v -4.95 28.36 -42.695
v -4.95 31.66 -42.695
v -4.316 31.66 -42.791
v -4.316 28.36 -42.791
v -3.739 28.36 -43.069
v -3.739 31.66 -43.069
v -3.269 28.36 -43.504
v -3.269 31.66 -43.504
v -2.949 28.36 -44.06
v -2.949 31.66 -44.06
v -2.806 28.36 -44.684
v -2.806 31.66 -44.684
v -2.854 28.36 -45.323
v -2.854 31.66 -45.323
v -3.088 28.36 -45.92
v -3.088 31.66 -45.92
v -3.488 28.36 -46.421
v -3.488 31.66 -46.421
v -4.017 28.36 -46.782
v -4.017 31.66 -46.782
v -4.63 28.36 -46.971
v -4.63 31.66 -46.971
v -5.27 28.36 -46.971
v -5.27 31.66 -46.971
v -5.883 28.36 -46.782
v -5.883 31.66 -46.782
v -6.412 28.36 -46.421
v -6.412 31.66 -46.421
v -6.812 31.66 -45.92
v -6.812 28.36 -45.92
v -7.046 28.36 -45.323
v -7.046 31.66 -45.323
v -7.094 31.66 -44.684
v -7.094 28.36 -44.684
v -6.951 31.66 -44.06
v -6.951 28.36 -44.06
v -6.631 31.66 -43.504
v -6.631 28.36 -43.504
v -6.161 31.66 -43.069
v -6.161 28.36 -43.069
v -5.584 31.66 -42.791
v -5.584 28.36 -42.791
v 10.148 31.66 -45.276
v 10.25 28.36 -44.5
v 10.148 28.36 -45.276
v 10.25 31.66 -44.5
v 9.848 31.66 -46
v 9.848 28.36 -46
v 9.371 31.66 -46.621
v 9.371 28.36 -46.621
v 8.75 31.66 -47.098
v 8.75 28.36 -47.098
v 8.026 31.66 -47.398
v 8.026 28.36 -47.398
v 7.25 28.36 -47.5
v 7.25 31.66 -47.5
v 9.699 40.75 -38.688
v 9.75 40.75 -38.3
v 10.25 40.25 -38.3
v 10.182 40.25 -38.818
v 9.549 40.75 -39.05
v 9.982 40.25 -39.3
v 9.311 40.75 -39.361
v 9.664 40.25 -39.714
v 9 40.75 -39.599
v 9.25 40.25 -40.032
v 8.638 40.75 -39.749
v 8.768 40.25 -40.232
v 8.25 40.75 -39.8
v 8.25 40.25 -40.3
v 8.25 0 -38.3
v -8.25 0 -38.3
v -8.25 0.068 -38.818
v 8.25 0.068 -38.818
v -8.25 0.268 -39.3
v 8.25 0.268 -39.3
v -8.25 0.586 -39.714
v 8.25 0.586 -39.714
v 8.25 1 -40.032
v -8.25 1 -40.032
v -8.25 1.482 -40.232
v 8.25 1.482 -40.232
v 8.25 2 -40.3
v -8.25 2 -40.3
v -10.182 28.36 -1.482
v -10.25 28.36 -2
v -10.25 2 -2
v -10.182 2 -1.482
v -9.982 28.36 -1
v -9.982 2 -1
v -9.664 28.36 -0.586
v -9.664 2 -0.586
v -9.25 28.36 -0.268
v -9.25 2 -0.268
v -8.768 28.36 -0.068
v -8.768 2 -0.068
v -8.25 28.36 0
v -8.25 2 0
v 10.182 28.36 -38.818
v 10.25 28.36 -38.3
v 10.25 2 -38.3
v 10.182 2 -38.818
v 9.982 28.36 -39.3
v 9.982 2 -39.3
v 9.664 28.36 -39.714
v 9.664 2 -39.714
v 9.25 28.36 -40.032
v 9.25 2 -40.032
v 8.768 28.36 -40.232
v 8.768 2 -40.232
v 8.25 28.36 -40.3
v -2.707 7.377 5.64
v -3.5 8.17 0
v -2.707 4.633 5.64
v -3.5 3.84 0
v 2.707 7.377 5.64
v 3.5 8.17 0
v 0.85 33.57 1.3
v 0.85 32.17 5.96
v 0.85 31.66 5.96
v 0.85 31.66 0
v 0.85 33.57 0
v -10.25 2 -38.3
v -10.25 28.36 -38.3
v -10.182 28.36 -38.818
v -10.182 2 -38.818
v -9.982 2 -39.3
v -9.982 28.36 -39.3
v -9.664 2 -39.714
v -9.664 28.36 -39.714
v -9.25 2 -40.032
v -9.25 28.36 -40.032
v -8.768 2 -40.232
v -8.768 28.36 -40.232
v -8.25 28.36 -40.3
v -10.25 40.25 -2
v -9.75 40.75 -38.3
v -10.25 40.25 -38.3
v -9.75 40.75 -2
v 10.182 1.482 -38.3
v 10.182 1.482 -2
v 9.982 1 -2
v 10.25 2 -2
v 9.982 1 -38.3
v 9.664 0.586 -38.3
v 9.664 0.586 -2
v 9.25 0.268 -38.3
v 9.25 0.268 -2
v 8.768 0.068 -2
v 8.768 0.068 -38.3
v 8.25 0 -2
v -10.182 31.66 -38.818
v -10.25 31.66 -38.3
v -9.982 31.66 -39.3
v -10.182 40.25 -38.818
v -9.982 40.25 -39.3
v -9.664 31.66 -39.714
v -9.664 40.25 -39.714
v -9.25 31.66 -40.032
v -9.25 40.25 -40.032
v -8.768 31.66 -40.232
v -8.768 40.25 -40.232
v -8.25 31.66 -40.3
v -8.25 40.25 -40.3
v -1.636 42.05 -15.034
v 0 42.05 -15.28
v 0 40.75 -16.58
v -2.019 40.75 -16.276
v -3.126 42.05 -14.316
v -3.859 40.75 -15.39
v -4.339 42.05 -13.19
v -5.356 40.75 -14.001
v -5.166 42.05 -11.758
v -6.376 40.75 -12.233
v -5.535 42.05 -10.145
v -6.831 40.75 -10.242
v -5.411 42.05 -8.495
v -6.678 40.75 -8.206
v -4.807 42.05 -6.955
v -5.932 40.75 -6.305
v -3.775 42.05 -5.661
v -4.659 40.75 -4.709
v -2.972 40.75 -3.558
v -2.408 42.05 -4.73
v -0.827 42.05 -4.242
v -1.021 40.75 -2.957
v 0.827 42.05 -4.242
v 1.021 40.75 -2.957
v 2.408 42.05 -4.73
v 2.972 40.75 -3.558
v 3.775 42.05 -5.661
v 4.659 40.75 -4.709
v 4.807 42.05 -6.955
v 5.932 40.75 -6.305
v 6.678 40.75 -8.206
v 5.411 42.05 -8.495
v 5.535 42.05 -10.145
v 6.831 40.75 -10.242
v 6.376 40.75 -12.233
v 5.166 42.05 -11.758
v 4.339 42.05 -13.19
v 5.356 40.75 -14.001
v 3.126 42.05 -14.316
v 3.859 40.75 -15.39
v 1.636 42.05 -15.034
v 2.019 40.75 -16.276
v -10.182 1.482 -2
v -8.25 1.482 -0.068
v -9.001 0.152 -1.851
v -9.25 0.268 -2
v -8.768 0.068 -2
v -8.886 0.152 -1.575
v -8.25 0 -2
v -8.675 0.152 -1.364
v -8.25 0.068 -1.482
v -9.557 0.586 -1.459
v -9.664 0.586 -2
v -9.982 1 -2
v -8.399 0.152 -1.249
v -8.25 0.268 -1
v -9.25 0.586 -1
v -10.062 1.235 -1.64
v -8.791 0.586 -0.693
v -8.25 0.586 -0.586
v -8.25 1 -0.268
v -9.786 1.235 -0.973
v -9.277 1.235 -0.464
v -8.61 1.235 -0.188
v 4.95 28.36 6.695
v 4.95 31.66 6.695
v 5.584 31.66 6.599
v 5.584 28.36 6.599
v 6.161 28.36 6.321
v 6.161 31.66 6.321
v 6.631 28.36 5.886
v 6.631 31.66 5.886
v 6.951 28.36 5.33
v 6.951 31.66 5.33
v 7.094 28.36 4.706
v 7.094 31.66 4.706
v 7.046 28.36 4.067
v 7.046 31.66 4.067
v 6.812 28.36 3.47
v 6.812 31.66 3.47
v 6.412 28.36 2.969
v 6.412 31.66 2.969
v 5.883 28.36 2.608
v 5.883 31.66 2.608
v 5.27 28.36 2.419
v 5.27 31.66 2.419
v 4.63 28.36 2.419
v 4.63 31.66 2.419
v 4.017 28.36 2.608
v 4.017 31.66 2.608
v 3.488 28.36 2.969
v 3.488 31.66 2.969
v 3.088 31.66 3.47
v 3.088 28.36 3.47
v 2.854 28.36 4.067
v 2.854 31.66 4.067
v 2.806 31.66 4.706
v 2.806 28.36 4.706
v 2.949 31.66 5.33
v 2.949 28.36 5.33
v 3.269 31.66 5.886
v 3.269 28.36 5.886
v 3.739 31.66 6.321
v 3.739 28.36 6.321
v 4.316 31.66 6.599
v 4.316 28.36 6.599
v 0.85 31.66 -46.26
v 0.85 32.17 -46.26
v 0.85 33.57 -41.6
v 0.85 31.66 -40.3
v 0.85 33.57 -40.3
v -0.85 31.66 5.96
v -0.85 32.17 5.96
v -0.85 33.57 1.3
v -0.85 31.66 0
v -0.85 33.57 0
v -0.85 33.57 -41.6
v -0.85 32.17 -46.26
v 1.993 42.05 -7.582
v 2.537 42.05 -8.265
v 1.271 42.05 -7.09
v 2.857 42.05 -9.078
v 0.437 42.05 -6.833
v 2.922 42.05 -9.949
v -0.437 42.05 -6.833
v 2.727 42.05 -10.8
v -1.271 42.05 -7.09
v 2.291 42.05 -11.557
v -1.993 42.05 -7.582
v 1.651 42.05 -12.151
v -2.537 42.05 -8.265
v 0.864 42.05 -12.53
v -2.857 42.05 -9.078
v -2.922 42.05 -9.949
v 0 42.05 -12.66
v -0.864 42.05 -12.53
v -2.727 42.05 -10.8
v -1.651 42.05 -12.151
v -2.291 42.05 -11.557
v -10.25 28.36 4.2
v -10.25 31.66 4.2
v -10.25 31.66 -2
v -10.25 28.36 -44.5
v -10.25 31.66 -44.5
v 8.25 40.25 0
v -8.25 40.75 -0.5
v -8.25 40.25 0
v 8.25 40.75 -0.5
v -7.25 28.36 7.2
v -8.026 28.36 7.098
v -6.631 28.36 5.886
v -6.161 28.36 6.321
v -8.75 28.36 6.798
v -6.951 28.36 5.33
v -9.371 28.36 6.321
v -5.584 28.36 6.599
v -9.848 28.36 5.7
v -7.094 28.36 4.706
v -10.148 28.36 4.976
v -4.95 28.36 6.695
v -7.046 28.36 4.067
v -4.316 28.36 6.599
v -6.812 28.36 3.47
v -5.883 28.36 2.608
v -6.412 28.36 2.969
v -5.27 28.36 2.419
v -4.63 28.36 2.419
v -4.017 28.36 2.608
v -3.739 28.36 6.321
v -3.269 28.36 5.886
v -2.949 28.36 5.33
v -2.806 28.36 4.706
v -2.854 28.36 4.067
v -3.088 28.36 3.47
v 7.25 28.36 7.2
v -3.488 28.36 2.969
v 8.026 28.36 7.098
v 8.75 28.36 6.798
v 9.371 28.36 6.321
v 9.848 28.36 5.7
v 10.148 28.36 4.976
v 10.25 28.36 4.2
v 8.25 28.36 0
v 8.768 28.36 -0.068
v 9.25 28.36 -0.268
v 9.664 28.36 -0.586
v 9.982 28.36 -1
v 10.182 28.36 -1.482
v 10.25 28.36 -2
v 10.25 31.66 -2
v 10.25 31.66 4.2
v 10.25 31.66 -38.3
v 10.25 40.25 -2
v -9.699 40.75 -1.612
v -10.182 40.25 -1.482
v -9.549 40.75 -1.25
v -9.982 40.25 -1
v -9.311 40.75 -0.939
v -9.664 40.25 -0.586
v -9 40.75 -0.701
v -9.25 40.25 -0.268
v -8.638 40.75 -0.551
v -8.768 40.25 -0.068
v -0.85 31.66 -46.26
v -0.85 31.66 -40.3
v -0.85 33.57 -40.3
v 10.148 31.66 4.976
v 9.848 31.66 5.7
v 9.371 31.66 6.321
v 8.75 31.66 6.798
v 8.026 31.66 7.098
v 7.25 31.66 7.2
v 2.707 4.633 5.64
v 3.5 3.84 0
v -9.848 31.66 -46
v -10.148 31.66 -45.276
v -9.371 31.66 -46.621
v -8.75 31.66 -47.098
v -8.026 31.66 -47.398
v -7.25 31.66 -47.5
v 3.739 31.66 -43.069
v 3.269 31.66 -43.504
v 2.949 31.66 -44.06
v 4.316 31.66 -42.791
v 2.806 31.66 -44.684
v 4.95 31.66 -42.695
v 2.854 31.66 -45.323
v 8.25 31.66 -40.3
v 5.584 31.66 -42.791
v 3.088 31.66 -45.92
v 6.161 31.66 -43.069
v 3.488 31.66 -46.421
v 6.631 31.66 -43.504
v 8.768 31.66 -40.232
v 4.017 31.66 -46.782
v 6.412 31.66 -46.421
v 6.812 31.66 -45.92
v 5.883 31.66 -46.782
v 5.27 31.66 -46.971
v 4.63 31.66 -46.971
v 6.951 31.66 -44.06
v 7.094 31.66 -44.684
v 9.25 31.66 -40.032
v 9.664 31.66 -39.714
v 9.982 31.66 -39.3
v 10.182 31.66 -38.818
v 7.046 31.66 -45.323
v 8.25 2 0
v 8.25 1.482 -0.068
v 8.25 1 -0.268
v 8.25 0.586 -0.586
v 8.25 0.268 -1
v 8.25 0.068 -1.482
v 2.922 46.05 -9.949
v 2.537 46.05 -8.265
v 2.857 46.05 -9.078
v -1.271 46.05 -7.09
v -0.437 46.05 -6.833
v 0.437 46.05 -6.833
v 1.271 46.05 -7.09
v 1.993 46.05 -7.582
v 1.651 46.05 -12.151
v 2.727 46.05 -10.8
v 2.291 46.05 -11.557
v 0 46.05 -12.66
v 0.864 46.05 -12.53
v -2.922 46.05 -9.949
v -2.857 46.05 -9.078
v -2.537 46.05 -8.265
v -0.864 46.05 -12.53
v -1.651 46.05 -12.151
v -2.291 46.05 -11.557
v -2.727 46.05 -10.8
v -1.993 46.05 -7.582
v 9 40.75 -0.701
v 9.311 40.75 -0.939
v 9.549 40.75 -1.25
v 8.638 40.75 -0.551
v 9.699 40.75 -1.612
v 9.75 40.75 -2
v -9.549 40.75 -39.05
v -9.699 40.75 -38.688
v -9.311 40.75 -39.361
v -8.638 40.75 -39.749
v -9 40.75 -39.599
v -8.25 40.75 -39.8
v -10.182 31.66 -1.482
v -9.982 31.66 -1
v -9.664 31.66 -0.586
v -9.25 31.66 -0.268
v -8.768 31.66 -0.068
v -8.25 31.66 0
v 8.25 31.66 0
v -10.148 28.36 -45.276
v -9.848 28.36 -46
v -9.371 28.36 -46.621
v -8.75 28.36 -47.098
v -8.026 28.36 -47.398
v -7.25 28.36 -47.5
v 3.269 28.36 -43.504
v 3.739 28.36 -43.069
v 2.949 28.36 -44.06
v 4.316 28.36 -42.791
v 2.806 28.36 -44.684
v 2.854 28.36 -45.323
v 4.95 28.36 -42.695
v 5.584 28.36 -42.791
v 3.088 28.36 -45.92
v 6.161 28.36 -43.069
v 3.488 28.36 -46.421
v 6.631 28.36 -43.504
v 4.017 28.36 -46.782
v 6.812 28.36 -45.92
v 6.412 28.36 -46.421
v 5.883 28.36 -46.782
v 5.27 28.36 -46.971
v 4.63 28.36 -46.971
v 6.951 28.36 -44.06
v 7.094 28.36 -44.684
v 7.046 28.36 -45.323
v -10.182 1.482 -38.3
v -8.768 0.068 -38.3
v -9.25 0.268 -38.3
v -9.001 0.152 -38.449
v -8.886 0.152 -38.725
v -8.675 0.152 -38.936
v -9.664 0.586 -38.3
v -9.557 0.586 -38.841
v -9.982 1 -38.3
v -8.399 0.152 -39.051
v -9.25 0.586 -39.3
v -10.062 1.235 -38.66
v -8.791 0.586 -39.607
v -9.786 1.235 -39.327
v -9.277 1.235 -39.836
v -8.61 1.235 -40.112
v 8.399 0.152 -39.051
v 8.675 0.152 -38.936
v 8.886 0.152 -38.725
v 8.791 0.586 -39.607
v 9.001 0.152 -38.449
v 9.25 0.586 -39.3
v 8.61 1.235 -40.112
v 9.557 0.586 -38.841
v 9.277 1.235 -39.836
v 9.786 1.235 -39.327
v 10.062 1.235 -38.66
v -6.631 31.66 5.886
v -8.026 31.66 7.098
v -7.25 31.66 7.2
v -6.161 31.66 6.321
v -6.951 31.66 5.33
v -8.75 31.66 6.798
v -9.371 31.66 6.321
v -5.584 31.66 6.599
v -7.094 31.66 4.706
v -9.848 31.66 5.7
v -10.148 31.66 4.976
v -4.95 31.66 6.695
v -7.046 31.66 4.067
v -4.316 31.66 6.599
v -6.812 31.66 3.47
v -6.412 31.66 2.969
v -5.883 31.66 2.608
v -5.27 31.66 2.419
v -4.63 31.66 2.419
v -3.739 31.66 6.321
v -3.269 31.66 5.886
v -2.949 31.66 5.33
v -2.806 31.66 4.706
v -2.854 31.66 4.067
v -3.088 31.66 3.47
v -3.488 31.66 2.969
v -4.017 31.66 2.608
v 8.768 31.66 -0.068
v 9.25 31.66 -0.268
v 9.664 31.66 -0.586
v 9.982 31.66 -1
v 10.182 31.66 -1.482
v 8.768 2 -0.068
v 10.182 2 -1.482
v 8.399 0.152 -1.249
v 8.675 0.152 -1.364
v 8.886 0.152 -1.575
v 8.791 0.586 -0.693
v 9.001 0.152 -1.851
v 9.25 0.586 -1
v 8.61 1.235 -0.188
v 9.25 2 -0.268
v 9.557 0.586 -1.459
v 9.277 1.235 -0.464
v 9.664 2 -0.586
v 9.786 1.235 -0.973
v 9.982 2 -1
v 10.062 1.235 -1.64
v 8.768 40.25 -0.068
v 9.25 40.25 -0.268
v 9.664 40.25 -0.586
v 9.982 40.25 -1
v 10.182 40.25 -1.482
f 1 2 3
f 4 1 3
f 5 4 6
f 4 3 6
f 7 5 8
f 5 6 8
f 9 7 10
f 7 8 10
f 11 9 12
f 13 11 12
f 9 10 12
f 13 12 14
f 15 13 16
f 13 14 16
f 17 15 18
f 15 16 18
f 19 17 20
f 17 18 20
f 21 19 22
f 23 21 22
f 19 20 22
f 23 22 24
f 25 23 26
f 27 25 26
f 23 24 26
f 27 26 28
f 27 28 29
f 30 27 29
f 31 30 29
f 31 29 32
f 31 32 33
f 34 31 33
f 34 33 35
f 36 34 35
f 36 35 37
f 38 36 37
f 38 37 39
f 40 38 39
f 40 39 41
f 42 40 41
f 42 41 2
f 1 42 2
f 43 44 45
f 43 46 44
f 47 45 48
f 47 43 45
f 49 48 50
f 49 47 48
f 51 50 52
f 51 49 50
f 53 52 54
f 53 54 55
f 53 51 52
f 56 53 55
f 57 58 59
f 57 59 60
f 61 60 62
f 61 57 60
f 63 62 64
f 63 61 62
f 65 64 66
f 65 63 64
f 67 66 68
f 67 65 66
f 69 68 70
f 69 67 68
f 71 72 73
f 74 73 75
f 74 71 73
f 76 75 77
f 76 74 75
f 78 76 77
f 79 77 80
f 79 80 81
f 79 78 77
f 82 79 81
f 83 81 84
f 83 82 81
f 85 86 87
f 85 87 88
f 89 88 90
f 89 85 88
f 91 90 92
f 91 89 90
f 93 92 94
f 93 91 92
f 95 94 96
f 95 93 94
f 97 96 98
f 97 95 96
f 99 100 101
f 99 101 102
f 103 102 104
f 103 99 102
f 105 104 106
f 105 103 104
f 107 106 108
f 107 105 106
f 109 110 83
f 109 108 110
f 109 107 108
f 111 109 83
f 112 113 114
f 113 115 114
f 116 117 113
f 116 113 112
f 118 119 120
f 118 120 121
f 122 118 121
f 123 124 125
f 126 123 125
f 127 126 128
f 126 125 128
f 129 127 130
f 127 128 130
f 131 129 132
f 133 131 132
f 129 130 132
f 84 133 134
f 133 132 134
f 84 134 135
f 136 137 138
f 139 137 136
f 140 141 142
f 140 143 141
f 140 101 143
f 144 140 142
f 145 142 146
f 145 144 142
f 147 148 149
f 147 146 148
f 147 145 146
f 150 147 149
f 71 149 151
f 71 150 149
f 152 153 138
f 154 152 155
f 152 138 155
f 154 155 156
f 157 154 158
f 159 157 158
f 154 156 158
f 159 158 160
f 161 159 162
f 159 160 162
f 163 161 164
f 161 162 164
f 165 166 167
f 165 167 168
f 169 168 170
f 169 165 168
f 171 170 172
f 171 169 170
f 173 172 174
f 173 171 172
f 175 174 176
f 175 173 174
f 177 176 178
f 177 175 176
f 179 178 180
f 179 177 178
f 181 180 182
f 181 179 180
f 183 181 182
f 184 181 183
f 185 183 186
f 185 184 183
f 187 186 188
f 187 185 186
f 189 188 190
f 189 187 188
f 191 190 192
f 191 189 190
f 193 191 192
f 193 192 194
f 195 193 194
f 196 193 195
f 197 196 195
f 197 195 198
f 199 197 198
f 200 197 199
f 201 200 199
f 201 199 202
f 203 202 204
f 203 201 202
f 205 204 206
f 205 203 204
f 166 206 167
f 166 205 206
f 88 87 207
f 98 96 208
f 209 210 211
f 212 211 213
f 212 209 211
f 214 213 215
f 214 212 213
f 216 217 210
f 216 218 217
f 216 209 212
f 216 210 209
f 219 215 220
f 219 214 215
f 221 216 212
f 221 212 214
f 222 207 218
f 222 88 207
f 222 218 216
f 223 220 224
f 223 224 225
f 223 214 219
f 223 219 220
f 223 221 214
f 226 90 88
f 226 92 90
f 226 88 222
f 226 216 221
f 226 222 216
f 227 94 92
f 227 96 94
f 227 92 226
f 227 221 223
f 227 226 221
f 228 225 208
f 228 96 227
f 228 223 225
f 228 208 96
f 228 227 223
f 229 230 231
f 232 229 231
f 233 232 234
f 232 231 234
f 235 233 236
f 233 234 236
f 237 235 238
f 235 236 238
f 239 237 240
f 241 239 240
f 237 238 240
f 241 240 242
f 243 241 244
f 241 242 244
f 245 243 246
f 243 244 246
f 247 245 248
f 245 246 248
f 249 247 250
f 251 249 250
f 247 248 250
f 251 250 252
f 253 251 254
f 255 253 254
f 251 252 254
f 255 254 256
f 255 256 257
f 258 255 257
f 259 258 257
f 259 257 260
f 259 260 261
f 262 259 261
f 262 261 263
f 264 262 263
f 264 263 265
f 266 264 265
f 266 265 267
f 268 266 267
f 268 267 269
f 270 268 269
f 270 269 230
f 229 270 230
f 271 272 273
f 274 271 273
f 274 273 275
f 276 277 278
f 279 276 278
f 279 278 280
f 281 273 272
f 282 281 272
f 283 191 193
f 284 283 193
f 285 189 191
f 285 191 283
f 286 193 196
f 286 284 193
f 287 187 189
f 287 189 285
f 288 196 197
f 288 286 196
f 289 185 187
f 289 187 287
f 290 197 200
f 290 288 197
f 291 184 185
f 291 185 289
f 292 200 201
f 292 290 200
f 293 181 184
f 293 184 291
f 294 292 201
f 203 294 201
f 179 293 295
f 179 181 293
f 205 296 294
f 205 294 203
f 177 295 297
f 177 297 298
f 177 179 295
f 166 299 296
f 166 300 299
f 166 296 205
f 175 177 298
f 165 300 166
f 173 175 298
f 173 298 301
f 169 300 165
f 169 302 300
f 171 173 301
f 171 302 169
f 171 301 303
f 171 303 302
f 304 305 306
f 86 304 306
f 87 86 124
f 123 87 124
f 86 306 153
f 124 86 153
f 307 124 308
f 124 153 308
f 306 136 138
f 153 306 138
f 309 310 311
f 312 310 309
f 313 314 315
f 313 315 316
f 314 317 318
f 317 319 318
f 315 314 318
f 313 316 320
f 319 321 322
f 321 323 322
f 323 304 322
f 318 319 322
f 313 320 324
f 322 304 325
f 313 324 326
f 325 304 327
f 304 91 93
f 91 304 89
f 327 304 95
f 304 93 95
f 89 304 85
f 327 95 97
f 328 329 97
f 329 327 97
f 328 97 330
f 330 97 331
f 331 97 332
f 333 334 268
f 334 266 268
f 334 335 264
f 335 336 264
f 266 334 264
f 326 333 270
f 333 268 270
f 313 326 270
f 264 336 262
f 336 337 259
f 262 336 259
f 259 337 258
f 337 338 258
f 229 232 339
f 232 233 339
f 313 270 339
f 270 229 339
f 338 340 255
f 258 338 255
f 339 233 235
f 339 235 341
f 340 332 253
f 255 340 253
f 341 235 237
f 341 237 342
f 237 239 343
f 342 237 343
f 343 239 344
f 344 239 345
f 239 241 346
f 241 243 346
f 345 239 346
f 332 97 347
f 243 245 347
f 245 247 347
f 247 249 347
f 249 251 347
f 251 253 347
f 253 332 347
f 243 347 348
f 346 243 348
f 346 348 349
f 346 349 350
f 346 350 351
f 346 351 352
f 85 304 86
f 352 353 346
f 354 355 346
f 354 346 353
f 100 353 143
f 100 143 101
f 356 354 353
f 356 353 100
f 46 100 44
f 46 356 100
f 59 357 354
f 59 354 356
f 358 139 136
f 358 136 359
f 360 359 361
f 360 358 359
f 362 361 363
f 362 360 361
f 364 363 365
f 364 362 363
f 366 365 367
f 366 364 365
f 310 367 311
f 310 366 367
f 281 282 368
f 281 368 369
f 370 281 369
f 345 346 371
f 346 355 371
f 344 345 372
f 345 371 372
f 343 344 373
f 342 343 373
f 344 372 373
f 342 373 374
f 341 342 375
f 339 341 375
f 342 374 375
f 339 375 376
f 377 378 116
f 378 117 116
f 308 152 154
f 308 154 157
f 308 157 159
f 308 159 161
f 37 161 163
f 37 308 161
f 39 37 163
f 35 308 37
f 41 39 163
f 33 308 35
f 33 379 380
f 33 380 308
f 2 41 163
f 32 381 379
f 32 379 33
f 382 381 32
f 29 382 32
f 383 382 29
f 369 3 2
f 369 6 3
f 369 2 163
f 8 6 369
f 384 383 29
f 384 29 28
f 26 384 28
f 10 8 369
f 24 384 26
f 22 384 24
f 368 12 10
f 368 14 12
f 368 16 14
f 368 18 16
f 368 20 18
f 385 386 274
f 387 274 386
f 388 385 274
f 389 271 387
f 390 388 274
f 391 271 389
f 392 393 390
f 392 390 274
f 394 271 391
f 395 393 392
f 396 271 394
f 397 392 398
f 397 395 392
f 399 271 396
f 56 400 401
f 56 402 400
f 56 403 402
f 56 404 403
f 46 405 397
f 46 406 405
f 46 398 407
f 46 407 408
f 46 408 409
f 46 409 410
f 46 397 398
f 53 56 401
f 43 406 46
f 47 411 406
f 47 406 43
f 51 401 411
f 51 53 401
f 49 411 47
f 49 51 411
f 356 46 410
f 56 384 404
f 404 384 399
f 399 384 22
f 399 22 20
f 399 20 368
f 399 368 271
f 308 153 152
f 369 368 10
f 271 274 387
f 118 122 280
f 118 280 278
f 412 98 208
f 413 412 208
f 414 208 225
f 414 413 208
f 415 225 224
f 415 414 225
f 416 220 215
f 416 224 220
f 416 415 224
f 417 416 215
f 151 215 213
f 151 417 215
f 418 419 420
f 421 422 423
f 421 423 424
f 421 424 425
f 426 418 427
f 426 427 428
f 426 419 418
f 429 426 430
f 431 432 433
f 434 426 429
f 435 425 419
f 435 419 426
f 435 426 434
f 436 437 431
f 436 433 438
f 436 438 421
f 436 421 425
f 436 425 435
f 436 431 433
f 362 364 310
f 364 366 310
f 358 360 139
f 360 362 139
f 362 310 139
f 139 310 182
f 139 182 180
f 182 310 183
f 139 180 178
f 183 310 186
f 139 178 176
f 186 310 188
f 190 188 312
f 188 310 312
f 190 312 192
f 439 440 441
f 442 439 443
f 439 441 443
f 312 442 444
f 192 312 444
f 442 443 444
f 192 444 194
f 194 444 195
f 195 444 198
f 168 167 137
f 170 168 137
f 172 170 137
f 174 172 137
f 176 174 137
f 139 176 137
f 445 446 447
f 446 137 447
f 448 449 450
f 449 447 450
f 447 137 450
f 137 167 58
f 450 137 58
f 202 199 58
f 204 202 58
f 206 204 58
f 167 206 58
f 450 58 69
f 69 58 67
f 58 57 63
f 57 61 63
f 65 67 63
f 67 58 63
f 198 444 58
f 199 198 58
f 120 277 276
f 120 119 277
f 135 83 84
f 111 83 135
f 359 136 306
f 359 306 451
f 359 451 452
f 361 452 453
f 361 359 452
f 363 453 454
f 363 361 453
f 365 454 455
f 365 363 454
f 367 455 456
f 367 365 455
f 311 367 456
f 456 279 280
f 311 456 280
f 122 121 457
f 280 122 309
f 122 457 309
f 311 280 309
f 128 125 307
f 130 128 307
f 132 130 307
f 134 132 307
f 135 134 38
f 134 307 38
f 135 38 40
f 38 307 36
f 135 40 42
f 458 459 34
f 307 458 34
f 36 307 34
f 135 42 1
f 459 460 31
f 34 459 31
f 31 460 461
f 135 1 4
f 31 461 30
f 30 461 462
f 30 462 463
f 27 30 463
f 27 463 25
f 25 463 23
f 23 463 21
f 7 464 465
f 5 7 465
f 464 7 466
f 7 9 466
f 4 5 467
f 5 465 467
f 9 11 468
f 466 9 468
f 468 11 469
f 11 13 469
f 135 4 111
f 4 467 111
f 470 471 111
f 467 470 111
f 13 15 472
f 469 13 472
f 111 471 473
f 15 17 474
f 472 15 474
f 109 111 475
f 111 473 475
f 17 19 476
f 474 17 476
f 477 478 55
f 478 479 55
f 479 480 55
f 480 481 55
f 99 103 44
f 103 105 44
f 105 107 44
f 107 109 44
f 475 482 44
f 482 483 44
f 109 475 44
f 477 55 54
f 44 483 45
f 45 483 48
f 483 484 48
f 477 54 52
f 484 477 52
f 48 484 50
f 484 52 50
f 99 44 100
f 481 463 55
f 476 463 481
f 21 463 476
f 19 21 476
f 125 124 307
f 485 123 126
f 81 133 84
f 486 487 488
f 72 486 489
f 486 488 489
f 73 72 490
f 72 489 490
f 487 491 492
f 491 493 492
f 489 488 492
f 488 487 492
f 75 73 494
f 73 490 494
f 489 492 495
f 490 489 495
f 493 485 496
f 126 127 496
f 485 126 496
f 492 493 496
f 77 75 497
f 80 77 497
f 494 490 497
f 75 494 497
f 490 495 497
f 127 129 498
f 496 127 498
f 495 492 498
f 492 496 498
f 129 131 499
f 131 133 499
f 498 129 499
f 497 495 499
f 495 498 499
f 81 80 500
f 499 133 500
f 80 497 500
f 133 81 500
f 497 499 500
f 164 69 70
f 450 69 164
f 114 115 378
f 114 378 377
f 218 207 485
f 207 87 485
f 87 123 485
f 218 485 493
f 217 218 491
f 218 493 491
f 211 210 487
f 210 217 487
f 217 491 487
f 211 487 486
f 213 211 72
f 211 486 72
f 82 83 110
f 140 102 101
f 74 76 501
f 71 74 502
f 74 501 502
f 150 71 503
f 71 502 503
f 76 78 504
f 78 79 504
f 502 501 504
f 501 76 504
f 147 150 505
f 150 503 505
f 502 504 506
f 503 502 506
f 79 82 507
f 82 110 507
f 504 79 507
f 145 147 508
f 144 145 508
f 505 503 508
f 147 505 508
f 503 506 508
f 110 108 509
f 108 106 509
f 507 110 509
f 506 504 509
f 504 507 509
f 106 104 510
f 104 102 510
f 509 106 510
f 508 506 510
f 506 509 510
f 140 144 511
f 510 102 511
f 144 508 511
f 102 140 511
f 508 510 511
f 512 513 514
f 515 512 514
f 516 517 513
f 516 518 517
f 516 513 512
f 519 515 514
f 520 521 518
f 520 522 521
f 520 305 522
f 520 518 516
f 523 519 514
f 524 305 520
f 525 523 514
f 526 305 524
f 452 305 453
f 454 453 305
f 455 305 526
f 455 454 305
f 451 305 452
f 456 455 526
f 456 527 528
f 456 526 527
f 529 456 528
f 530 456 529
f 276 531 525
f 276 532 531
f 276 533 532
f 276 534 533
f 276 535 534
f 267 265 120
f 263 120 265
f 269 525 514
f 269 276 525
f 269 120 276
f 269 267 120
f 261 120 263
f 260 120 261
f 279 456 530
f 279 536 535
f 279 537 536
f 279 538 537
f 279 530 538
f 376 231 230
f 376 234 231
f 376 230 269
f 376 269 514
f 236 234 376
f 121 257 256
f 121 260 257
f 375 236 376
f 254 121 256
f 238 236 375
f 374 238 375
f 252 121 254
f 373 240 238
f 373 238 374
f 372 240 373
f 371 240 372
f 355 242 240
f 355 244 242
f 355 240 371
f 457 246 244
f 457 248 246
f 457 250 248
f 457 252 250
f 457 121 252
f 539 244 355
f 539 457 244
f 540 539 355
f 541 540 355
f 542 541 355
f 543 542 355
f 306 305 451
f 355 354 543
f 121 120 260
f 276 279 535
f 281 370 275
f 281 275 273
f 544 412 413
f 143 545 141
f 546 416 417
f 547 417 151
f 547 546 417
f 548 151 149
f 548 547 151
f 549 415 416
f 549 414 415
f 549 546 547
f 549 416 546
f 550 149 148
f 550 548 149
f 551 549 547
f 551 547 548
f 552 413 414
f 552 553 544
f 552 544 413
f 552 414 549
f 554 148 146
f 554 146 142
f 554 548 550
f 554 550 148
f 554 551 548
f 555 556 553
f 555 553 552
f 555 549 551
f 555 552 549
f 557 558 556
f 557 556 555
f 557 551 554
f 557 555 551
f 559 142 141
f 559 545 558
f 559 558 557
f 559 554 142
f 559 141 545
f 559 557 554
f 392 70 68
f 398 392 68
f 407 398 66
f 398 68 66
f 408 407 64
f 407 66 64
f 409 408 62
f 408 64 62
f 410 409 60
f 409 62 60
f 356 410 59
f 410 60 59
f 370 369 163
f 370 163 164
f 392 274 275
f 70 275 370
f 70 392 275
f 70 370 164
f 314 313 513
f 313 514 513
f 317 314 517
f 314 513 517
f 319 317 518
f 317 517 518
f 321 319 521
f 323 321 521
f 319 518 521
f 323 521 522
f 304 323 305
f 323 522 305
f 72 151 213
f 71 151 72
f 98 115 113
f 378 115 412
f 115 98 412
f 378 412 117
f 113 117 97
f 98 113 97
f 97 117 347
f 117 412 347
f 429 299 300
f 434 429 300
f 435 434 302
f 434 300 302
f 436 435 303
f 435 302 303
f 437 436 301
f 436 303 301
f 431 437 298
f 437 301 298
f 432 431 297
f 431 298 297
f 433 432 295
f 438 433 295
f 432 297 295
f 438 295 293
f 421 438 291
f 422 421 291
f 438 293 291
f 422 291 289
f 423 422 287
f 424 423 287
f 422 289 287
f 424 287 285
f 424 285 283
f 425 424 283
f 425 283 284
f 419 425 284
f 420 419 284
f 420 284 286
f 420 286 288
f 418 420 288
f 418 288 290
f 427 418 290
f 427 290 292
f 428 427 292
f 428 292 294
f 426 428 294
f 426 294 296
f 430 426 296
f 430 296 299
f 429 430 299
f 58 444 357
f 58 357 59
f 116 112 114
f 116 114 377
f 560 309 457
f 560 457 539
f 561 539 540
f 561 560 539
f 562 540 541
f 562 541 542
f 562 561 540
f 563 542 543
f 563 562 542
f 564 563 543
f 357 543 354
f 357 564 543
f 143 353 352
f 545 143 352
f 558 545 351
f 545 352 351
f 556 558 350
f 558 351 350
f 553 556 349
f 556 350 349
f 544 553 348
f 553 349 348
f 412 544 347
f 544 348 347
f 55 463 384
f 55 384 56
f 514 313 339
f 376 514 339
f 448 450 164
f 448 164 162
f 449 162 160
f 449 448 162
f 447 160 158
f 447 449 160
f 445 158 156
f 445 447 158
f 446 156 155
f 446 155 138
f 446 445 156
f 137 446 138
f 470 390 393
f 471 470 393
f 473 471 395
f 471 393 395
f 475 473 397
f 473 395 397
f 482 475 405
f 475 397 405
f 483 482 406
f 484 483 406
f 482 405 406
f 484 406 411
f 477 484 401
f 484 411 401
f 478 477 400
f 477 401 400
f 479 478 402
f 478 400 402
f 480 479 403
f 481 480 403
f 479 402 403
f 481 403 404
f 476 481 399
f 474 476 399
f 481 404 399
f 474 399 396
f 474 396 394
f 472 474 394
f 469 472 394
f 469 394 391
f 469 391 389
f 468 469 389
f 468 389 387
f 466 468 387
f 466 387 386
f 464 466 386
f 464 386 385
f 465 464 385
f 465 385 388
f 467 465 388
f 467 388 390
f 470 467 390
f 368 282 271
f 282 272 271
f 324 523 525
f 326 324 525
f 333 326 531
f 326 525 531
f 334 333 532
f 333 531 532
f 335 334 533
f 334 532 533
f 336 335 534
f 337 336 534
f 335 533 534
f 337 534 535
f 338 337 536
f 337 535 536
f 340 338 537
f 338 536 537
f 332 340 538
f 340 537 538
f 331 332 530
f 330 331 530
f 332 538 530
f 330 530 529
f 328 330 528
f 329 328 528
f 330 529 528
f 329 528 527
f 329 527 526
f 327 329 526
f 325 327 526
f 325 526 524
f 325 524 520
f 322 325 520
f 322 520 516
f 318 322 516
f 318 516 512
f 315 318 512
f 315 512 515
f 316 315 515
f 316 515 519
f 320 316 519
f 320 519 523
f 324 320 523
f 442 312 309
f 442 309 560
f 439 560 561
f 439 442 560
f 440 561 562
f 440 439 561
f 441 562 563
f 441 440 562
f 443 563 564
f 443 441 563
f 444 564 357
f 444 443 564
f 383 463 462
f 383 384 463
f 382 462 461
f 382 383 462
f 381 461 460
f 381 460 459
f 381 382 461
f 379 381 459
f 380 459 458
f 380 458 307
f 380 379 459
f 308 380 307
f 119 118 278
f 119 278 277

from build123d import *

# Parameters (mm, degrees)
SKETCH1_W           = 40.3
SKETCH1_H           = 40.75
BOSS_EXTRUDE1_DEPTH = 10.25
SKETCH2_R           = 2.93
BOSS_EXTRUDE2_DEPTH = 5.3
SKETCH3_R           = 6.85
BOSS_EXTRUDE3_DEPTH = 1.3
CHAMFER1_SIZE       = 1.3
BOSS_EXTRUDE4_START = 28.36
SKETCH4_W           = 20.5
SKETCH4_H           = 7.2
BOSS_EXTRUDE4_DEPTH = 3.3
CUT_EXTRUDE1_REACH  = 59.997
SKETCH5_R           = 2.15
FILLET1_R           = 2
FILLET2_R           = 3
BOSS_EXTRUDE5_DEPTH = 0.85
CHAMFER2_SIZE       = 0.5
SKETCH8_W           = 7
SKETCH8_H           = 4.33
BOSS_EXTRUDE6_DEPTH = 5.64
BOSS_EXTRUDE6_TAPER = 8


with BuildPart() as part:
    # Sketch1 → Boss-Extrude1 (new, symmetric)
    with BuildSketch(Plane(origin=(0, 0, 0), x_dir=(0, 0, -1), z_dir=(1, 0, 0))):
        with Locations((20.15, 20.375)):
            Rectangle(SKETCH1_W, SKETCH1_H)
    extrude(amount=BOSS_EXTRUDE1_DEPTH, both=True)

    # Sketch2 → Boss-Extrude2 (add)
    with BuildSketch(Plane(origin=(0, 40.75, 0), x_dir=(1, 0, 0), z_dir=(0, 1, 0))):
        with Locations(Location((0, 9.73, 0), (0, 0, 90))):
            Circle(SKETCH2_R)
    extrude(amount=BOSS_EXTRUDE2_DEPTH)

    # Sketch3 → Boss-Extrude3 (add)
    with BuildSketch(Plane(origin=(0, 40.75, 0), x_dir=(1, 0, 0), z_dir=(0, 1, 0))):
        with Locations(Location((0, 9.73, 0), (0, 0, 90))):
            Circle(SKETCH3_R)
    extrude(amount=BOSS_EXTRUDE3_DEPTH)

    # Chamfer1
    chamfer1_edges = [part.edges().sort_by_distance(p)[0] for p in [
        (0, 42.05, -2.88),
    ]]
    chamfer(chamfer1_edges, length=CHAMFER1_SIZE - 0.0001)  # a hair under: the kernel refuses the full size

    # Sketch4 → Boss-Extrude4 (add)
    with BuildSketch(Plane(origin=(0, 0, 0), x_dir=(1, 0, 0), z_dir=(0, 1, 0)).offset(BOSS_EXTRUDE4_START)):
        with Locations((0, -3.6)):
            Rectangle(SKETCH4_W, SKETCH4_H)
        with Locations((0, 43.9)):
            Rectangle(SKETCH4_W, SKETCH4_H)
    extrude(amount=BOSS_EXTRUDE4_DEPTH)

    # Sketch5 → Cut-Extrude1 (cut, up to next)
    with BuildSketch(Plane(origin=(0, 31.66, 0), x_dir=(1, 0, 0), z_dir=(0, 1, 0)), mode=Mode.PRIVATE) as cut_extrude1_sk1:
        with Locations(Location((4.95, -4.545, 0), (0, 0, 270))):
            Circle(SKETCH5_R)
    cut_extrude1_tool1 = extrude(cut_extrude1_sk1.sketch, amount=-CUT_EXTRUDE1_REACH, mode=Mode.PRIVATE) & part.part
    # Sketch5 → Cut-Extrude1 (cut, up to next)
    with BuildSketch(Plane(origin=(0, 31.66, 0), x_dir=(1, 0, 0), z_dir=(0, 1, 0)), mode=Mode.PRIVATE) as cut_extrude1_sk2:
        with Locations(Location((-4.95, -4.545, 0), (0, 0, 270))):
            Circle(SKETCH5_R)
    cut_extrude1_tool2 = extrude(cut_extrude1_sk2.sketch, amount=-CUT_EXTRUDE1_REACH, mode=Mode.PRIVATE) & part.part
    # Sketch5 → Cut-Extrude1 (cut, up to next)
    with BuildSketch(Plane(origin=(0, 31.66, 0), x_dir=(1, 0, 0), z_dir=(0, 1, 0)), mode=Mode.PRIVATE) as cut_extrude1_sk3:
        with Locations(Location((4.95, 44.845, 0), (0, 0, 270))):
            Circle(SKETCH5_R)
    cut_extrude1_tool3 = extrude(cut_extrude1_sk3.sketch, amount=-CUT_EXTRUDE1_REACH, mode=Mode.PRIVATE) & part.part
    # Sketch5 → Cut-Extrude1 (cut, up to next)
    with BuildSketch(Plane(origin=(0, 31.66, 0), x_dir=(1, 0, 0), z_dir=(0, 1, 0)), mode=Mode.PRIVATE) as cut_extrude1_sk4:
        with Locations(Location((-4.95, 44.845, 0), (0, 0, 270))):
            Circle(SKETCH5_R)
    cut_extrude1_tool4 = extrude(cut_extrude1_sk4.sketch, amount=-CUT_EXTRUDE1_REACH, mode=Mode.PRIVATE) & part.part
    add(cut_extrude1_tool1.solids().sort_by_distance((4.95, 31.66, 4.545))[0], mode=Mode.SUBTRACT)
    add(cut_extrude1_tool2.solids().sort_by_distance((-4.95, 31.66, 4.545))[0], mode=Mode.SUBTRACT)
    add(cut_extrude1_tool3.solids().sort_by_distance((4.95, 31.66, -44.845))[0], mode=Mode.SUBTRACT)
    add(cut_extrude1_tool4.solids().sort_by_distance((-4.95, 31.66, -44.845))[0], mode=Mode.SUBTRACT)

    # Fillet1
    fillet1_edges = [part.edges().sort_by_distance(p)[0] for p in [
        (10.25, 14.18, -40.3),
        (-10.25, 14.18, 0),
        (10.25, 14.18, 0),
        (-10.25, 36.205, -40.3),
        (10.25, 36.205, -40.3),
        (10.25, 36.205, 0),
        (-10.25, 14.18, -40.3),
        (-10.25, 0, -20.15),
        (-10.25, 36.205, 0),
        (0, 0, -40.3),
        (0, 0, 0),
        (10.25, 0, -20.15),
    ]]
    fillet(fillet1_edges, radius=FILLET1_R)

    # Fillet2
    fillet2_edges = [part.edges().sort_by_distance(p)[0] for p in [
        (-10.25, 30.01, 7.2),
        (10.25, 30.01, 7.2),
        (10.25, 30.01, -47.5),
        (-10.25, 30.01, -47.5),
    ]]
    fillet(fillet2_edges, radius=FILLET2_R)

    # Sketch7 → Boss-Extrude5 (add, symmetric)
    with BuildSketch(Plane(origin=(0, 0, 0), x_dir=(0, 0, -1), z_dir=(1, 0, 0))):
        Polygon((0, 31.66), (0, 33.57), (-1.3, 33.57), (-5.96, 32.169632375), (-5.96, 31.66), align=None)
    boss_extrude5 = extrude(amount=BOSS_EXTRUDE5_DEPTH, both=True)

    # Mirror1: Boss-Extrude5 across plane
    add(boss_extrude5.mirror(Plane.XY.offset(-20.15)))

    # Chamfer2
    chamfer2_edges = [part.edges().sort_by_distance(p)[0] for p in [
        (10.25, 40.75, -20.15),
        (-10.25, 40.75, -20.15),
        (0, 40.75, 0),
        (0, 40.75, -40.3),
        (9.664213562, 40.75, -39.714213562),
        (-9.664213562, 40.75, -39.714213562),
        (9.664213562, 40.75, -0.585786438),
        (-9.664213562, 40.75, -0.585786438),
    ]]
    chamfer(chamfer2_edges, length=CHAMFER2_SIZE)

    # Sketch8 → Boss-Extrude6 (add)
    with BuildSketch(Plane.XY):
        with Locations((0, 6.005)):
            Rectangle(SKETCH8_W, SKETCH8_H)
    extrude(amount=BOSS_EXTRUDE6_DEPTH, taper=BOSS_EXTRUDE6_TAPER)


solid = part.part
